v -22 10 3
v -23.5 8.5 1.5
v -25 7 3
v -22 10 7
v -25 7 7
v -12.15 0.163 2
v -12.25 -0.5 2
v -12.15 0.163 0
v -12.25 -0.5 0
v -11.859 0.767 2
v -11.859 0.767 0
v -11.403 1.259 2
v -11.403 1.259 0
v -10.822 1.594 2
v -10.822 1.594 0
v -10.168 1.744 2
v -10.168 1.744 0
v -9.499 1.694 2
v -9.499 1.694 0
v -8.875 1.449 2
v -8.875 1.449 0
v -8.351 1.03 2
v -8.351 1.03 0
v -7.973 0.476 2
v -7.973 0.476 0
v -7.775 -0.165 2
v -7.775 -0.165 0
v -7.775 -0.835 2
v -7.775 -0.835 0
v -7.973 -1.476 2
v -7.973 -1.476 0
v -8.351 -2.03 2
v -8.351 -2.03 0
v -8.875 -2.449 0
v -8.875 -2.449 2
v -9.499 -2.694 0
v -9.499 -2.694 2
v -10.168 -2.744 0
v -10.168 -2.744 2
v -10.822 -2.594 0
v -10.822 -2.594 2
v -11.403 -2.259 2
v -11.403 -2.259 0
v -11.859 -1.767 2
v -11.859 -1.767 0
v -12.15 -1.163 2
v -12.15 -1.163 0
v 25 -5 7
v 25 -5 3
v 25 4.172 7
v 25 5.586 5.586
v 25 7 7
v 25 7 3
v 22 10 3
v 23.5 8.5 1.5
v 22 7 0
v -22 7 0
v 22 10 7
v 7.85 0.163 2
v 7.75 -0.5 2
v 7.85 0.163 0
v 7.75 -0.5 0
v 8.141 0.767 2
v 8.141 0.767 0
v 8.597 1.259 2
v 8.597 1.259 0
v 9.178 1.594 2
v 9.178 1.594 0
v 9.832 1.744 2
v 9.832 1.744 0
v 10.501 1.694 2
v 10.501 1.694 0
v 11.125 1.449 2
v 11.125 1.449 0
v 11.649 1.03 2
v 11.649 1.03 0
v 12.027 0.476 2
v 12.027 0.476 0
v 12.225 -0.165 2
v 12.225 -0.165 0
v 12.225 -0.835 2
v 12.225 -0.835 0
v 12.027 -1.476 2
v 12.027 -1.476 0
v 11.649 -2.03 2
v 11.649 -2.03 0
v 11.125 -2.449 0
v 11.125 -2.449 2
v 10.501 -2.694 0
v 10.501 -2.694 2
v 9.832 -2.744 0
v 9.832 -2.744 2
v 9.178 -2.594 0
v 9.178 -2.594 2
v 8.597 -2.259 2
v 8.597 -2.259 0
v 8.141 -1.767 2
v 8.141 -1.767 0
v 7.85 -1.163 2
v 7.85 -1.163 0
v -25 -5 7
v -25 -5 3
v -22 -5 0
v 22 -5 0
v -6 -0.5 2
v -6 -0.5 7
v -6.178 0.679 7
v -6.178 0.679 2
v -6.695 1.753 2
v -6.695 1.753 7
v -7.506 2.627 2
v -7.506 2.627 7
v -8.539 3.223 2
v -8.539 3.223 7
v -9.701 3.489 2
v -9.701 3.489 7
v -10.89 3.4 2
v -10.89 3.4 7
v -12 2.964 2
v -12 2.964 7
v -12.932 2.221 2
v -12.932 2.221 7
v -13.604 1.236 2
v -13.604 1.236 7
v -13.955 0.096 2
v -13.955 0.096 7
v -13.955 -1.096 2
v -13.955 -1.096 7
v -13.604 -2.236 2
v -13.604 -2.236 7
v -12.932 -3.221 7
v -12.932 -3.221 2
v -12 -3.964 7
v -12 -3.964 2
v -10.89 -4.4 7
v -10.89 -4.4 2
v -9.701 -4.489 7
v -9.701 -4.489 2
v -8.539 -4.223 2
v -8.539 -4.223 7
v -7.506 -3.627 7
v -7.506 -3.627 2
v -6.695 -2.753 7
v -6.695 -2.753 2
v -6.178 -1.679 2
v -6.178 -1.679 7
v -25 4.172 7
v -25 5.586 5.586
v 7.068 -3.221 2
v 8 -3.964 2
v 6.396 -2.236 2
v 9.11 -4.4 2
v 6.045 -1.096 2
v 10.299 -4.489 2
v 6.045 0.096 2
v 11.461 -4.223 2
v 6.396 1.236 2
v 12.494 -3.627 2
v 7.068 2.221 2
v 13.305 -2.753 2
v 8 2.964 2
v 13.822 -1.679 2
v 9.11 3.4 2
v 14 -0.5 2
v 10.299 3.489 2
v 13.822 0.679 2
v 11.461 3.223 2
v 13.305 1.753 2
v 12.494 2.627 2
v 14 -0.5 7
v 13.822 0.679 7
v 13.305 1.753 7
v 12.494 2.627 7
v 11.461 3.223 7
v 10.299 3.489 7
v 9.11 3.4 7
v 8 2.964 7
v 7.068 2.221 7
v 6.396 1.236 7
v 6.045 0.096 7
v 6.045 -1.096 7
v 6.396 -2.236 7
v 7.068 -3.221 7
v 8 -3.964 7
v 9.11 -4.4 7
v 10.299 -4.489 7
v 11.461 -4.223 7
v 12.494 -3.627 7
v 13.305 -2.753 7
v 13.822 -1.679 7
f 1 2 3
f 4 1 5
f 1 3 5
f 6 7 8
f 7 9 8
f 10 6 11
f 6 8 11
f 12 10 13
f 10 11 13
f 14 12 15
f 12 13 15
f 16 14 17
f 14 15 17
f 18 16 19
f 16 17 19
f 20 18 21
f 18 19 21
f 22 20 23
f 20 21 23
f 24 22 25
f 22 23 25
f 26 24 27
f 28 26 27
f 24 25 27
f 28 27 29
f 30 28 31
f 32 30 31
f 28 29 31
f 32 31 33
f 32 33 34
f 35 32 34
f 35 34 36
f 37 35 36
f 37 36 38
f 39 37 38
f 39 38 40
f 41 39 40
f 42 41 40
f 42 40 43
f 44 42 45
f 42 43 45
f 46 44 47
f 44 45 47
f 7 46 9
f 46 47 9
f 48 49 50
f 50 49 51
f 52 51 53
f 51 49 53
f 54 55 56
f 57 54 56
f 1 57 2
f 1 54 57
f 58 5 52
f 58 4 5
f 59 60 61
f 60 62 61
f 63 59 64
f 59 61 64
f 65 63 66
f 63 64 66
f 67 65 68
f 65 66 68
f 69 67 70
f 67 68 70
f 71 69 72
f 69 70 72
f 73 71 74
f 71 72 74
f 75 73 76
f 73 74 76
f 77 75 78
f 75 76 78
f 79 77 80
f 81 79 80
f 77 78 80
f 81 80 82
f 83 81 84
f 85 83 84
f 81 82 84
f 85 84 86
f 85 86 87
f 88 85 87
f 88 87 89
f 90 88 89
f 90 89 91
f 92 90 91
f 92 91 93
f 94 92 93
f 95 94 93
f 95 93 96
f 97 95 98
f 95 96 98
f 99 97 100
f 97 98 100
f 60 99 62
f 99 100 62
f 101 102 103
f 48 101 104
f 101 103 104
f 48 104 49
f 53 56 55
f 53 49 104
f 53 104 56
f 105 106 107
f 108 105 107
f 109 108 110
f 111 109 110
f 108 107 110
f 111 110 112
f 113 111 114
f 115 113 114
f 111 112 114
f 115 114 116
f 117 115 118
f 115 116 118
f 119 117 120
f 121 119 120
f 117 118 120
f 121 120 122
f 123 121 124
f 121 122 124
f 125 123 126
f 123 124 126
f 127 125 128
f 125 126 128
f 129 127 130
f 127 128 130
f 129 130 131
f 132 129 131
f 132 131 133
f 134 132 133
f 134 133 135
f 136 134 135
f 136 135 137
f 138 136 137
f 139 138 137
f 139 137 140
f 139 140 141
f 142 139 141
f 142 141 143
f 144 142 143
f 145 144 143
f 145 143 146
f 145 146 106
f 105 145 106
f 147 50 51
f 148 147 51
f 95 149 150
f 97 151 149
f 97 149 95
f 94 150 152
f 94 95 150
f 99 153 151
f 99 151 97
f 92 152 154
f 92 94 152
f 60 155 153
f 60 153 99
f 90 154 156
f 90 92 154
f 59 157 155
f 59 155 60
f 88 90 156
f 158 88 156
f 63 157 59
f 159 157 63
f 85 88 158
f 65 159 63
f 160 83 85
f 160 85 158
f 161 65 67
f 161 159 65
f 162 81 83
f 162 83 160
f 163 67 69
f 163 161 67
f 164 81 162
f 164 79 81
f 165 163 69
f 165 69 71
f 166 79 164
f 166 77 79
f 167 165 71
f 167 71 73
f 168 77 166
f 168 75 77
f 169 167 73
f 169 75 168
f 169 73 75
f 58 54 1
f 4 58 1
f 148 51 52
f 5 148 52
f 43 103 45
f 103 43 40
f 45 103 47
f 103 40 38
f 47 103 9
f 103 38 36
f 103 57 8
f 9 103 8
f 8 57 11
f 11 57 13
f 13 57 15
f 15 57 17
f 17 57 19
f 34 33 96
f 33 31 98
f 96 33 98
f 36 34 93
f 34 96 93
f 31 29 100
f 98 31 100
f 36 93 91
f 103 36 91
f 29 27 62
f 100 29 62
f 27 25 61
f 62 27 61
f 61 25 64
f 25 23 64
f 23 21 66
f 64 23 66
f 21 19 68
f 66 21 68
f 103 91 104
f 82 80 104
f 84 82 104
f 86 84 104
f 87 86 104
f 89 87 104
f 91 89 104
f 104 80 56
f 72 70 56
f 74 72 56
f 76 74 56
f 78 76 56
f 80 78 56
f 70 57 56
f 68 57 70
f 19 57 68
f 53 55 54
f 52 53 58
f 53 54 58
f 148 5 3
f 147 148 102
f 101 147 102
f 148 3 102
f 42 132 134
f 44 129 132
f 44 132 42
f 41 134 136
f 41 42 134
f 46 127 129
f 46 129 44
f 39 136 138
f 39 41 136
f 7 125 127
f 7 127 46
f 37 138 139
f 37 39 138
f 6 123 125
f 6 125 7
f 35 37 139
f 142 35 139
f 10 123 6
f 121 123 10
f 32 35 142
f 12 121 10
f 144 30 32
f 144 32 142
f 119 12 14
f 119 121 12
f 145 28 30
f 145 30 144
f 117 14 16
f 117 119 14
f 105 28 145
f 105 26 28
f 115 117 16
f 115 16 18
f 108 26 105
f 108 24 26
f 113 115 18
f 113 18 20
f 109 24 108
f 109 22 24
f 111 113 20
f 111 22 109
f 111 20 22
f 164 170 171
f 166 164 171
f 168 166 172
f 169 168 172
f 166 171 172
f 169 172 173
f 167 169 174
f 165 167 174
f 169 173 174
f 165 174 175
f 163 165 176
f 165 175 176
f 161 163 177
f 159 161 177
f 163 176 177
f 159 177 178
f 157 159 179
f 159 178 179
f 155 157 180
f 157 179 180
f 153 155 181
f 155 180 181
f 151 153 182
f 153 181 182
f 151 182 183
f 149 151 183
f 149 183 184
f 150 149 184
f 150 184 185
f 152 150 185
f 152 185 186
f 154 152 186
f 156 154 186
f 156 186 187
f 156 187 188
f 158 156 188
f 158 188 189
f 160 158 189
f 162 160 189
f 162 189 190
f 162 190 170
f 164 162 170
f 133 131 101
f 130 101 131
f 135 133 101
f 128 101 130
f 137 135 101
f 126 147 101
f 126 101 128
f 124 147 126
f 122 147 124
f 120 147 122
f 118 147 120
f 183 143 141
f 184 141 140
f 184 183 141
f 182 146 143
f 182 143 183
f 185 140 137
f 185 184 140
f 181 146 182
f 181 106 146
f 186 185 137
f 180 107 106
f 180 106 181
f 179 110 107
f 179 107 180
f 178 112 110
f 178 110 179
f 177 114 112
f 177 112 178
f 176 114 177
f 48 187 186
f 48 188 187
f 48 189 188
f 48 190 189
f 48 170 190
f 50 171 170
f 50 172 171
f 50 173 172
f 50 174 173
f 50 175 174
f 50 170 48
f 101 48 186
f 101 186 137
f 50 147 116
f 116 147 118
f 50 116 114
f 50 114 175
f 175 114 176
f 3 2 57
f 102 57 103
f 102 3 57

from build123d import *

# Parameters (mm, degrees)
F1_DEPTH       = 7
F3_D           = 4.5
F3_CBORE_D     = 8
F3_CBORE_DEPTH = 5
F4_SIZE        = 3
F5_SIZE        = 3
F7_DEPTH       = 50


with BuildPart() as f1:
    # F0 (on Top) → F1 (new body)
    with BuildSketch(Plane.XY):
        Polygon((-20, -5), (20, -5), (25, -5), (25, 10), (20, 10), (-20, 10), (-25, 10), (-25, -5), align=None)
    extrude(amount=F1_DEPTH)

    # F3 (through all)
    with Locations(Plane.XY.offset(7)):
        with Locations((-10, -0.5), (10, -0.5)):
            CounterBoreHole(F3_D / 2, F3_CBORE_D / 2, F3_CBORE_DEPTH)

    # F4
    f4_edges = [f1.edges().sort_by_distance(p)[0] for p in [
        (-25, 10, 3.5),
        (25, 10, 3.5),
    ]]
    chamfer(f4_edges, length=F4_SIZE)

    # F5 (call 1 of 3: OpenCascade refuses the feature's edges together)
    f5_edges = [f1.edges().sort_by_distance(p)[0] for p in [
        (0, 10, 0),
    ]]
    chamfer(f5_edges, length=F5_SIZE)

    # F5#2 (call 2 of 3)
    f5_2_edges = [f1.edges().sort_by_distance(p)[0] for p in [
        (25, 1, 0),
    ]]
    chamfer(f5_2_edges, length=F5_SIZE)

    # F5#3 (call 3 of 3)
    f5_3_edges = [f1.edges().sort_by_distance(p)[0] for p in [
        (-25, 1, 0),
    ]]
    chamfer(f5_3_edges, length=F5_SIZE)

    # F6 (on face) → F7 (cut)
    with BuildSketch(Plane.YZ.offset(25)):
        Polygon((5.5857864376, 5.5857864376), (7, 7), (4.1715728753, 7), align=None)
    extrude(amount=-F7_DEPTH, mode=Mode.SUBTRACT)


solid = f1.part
